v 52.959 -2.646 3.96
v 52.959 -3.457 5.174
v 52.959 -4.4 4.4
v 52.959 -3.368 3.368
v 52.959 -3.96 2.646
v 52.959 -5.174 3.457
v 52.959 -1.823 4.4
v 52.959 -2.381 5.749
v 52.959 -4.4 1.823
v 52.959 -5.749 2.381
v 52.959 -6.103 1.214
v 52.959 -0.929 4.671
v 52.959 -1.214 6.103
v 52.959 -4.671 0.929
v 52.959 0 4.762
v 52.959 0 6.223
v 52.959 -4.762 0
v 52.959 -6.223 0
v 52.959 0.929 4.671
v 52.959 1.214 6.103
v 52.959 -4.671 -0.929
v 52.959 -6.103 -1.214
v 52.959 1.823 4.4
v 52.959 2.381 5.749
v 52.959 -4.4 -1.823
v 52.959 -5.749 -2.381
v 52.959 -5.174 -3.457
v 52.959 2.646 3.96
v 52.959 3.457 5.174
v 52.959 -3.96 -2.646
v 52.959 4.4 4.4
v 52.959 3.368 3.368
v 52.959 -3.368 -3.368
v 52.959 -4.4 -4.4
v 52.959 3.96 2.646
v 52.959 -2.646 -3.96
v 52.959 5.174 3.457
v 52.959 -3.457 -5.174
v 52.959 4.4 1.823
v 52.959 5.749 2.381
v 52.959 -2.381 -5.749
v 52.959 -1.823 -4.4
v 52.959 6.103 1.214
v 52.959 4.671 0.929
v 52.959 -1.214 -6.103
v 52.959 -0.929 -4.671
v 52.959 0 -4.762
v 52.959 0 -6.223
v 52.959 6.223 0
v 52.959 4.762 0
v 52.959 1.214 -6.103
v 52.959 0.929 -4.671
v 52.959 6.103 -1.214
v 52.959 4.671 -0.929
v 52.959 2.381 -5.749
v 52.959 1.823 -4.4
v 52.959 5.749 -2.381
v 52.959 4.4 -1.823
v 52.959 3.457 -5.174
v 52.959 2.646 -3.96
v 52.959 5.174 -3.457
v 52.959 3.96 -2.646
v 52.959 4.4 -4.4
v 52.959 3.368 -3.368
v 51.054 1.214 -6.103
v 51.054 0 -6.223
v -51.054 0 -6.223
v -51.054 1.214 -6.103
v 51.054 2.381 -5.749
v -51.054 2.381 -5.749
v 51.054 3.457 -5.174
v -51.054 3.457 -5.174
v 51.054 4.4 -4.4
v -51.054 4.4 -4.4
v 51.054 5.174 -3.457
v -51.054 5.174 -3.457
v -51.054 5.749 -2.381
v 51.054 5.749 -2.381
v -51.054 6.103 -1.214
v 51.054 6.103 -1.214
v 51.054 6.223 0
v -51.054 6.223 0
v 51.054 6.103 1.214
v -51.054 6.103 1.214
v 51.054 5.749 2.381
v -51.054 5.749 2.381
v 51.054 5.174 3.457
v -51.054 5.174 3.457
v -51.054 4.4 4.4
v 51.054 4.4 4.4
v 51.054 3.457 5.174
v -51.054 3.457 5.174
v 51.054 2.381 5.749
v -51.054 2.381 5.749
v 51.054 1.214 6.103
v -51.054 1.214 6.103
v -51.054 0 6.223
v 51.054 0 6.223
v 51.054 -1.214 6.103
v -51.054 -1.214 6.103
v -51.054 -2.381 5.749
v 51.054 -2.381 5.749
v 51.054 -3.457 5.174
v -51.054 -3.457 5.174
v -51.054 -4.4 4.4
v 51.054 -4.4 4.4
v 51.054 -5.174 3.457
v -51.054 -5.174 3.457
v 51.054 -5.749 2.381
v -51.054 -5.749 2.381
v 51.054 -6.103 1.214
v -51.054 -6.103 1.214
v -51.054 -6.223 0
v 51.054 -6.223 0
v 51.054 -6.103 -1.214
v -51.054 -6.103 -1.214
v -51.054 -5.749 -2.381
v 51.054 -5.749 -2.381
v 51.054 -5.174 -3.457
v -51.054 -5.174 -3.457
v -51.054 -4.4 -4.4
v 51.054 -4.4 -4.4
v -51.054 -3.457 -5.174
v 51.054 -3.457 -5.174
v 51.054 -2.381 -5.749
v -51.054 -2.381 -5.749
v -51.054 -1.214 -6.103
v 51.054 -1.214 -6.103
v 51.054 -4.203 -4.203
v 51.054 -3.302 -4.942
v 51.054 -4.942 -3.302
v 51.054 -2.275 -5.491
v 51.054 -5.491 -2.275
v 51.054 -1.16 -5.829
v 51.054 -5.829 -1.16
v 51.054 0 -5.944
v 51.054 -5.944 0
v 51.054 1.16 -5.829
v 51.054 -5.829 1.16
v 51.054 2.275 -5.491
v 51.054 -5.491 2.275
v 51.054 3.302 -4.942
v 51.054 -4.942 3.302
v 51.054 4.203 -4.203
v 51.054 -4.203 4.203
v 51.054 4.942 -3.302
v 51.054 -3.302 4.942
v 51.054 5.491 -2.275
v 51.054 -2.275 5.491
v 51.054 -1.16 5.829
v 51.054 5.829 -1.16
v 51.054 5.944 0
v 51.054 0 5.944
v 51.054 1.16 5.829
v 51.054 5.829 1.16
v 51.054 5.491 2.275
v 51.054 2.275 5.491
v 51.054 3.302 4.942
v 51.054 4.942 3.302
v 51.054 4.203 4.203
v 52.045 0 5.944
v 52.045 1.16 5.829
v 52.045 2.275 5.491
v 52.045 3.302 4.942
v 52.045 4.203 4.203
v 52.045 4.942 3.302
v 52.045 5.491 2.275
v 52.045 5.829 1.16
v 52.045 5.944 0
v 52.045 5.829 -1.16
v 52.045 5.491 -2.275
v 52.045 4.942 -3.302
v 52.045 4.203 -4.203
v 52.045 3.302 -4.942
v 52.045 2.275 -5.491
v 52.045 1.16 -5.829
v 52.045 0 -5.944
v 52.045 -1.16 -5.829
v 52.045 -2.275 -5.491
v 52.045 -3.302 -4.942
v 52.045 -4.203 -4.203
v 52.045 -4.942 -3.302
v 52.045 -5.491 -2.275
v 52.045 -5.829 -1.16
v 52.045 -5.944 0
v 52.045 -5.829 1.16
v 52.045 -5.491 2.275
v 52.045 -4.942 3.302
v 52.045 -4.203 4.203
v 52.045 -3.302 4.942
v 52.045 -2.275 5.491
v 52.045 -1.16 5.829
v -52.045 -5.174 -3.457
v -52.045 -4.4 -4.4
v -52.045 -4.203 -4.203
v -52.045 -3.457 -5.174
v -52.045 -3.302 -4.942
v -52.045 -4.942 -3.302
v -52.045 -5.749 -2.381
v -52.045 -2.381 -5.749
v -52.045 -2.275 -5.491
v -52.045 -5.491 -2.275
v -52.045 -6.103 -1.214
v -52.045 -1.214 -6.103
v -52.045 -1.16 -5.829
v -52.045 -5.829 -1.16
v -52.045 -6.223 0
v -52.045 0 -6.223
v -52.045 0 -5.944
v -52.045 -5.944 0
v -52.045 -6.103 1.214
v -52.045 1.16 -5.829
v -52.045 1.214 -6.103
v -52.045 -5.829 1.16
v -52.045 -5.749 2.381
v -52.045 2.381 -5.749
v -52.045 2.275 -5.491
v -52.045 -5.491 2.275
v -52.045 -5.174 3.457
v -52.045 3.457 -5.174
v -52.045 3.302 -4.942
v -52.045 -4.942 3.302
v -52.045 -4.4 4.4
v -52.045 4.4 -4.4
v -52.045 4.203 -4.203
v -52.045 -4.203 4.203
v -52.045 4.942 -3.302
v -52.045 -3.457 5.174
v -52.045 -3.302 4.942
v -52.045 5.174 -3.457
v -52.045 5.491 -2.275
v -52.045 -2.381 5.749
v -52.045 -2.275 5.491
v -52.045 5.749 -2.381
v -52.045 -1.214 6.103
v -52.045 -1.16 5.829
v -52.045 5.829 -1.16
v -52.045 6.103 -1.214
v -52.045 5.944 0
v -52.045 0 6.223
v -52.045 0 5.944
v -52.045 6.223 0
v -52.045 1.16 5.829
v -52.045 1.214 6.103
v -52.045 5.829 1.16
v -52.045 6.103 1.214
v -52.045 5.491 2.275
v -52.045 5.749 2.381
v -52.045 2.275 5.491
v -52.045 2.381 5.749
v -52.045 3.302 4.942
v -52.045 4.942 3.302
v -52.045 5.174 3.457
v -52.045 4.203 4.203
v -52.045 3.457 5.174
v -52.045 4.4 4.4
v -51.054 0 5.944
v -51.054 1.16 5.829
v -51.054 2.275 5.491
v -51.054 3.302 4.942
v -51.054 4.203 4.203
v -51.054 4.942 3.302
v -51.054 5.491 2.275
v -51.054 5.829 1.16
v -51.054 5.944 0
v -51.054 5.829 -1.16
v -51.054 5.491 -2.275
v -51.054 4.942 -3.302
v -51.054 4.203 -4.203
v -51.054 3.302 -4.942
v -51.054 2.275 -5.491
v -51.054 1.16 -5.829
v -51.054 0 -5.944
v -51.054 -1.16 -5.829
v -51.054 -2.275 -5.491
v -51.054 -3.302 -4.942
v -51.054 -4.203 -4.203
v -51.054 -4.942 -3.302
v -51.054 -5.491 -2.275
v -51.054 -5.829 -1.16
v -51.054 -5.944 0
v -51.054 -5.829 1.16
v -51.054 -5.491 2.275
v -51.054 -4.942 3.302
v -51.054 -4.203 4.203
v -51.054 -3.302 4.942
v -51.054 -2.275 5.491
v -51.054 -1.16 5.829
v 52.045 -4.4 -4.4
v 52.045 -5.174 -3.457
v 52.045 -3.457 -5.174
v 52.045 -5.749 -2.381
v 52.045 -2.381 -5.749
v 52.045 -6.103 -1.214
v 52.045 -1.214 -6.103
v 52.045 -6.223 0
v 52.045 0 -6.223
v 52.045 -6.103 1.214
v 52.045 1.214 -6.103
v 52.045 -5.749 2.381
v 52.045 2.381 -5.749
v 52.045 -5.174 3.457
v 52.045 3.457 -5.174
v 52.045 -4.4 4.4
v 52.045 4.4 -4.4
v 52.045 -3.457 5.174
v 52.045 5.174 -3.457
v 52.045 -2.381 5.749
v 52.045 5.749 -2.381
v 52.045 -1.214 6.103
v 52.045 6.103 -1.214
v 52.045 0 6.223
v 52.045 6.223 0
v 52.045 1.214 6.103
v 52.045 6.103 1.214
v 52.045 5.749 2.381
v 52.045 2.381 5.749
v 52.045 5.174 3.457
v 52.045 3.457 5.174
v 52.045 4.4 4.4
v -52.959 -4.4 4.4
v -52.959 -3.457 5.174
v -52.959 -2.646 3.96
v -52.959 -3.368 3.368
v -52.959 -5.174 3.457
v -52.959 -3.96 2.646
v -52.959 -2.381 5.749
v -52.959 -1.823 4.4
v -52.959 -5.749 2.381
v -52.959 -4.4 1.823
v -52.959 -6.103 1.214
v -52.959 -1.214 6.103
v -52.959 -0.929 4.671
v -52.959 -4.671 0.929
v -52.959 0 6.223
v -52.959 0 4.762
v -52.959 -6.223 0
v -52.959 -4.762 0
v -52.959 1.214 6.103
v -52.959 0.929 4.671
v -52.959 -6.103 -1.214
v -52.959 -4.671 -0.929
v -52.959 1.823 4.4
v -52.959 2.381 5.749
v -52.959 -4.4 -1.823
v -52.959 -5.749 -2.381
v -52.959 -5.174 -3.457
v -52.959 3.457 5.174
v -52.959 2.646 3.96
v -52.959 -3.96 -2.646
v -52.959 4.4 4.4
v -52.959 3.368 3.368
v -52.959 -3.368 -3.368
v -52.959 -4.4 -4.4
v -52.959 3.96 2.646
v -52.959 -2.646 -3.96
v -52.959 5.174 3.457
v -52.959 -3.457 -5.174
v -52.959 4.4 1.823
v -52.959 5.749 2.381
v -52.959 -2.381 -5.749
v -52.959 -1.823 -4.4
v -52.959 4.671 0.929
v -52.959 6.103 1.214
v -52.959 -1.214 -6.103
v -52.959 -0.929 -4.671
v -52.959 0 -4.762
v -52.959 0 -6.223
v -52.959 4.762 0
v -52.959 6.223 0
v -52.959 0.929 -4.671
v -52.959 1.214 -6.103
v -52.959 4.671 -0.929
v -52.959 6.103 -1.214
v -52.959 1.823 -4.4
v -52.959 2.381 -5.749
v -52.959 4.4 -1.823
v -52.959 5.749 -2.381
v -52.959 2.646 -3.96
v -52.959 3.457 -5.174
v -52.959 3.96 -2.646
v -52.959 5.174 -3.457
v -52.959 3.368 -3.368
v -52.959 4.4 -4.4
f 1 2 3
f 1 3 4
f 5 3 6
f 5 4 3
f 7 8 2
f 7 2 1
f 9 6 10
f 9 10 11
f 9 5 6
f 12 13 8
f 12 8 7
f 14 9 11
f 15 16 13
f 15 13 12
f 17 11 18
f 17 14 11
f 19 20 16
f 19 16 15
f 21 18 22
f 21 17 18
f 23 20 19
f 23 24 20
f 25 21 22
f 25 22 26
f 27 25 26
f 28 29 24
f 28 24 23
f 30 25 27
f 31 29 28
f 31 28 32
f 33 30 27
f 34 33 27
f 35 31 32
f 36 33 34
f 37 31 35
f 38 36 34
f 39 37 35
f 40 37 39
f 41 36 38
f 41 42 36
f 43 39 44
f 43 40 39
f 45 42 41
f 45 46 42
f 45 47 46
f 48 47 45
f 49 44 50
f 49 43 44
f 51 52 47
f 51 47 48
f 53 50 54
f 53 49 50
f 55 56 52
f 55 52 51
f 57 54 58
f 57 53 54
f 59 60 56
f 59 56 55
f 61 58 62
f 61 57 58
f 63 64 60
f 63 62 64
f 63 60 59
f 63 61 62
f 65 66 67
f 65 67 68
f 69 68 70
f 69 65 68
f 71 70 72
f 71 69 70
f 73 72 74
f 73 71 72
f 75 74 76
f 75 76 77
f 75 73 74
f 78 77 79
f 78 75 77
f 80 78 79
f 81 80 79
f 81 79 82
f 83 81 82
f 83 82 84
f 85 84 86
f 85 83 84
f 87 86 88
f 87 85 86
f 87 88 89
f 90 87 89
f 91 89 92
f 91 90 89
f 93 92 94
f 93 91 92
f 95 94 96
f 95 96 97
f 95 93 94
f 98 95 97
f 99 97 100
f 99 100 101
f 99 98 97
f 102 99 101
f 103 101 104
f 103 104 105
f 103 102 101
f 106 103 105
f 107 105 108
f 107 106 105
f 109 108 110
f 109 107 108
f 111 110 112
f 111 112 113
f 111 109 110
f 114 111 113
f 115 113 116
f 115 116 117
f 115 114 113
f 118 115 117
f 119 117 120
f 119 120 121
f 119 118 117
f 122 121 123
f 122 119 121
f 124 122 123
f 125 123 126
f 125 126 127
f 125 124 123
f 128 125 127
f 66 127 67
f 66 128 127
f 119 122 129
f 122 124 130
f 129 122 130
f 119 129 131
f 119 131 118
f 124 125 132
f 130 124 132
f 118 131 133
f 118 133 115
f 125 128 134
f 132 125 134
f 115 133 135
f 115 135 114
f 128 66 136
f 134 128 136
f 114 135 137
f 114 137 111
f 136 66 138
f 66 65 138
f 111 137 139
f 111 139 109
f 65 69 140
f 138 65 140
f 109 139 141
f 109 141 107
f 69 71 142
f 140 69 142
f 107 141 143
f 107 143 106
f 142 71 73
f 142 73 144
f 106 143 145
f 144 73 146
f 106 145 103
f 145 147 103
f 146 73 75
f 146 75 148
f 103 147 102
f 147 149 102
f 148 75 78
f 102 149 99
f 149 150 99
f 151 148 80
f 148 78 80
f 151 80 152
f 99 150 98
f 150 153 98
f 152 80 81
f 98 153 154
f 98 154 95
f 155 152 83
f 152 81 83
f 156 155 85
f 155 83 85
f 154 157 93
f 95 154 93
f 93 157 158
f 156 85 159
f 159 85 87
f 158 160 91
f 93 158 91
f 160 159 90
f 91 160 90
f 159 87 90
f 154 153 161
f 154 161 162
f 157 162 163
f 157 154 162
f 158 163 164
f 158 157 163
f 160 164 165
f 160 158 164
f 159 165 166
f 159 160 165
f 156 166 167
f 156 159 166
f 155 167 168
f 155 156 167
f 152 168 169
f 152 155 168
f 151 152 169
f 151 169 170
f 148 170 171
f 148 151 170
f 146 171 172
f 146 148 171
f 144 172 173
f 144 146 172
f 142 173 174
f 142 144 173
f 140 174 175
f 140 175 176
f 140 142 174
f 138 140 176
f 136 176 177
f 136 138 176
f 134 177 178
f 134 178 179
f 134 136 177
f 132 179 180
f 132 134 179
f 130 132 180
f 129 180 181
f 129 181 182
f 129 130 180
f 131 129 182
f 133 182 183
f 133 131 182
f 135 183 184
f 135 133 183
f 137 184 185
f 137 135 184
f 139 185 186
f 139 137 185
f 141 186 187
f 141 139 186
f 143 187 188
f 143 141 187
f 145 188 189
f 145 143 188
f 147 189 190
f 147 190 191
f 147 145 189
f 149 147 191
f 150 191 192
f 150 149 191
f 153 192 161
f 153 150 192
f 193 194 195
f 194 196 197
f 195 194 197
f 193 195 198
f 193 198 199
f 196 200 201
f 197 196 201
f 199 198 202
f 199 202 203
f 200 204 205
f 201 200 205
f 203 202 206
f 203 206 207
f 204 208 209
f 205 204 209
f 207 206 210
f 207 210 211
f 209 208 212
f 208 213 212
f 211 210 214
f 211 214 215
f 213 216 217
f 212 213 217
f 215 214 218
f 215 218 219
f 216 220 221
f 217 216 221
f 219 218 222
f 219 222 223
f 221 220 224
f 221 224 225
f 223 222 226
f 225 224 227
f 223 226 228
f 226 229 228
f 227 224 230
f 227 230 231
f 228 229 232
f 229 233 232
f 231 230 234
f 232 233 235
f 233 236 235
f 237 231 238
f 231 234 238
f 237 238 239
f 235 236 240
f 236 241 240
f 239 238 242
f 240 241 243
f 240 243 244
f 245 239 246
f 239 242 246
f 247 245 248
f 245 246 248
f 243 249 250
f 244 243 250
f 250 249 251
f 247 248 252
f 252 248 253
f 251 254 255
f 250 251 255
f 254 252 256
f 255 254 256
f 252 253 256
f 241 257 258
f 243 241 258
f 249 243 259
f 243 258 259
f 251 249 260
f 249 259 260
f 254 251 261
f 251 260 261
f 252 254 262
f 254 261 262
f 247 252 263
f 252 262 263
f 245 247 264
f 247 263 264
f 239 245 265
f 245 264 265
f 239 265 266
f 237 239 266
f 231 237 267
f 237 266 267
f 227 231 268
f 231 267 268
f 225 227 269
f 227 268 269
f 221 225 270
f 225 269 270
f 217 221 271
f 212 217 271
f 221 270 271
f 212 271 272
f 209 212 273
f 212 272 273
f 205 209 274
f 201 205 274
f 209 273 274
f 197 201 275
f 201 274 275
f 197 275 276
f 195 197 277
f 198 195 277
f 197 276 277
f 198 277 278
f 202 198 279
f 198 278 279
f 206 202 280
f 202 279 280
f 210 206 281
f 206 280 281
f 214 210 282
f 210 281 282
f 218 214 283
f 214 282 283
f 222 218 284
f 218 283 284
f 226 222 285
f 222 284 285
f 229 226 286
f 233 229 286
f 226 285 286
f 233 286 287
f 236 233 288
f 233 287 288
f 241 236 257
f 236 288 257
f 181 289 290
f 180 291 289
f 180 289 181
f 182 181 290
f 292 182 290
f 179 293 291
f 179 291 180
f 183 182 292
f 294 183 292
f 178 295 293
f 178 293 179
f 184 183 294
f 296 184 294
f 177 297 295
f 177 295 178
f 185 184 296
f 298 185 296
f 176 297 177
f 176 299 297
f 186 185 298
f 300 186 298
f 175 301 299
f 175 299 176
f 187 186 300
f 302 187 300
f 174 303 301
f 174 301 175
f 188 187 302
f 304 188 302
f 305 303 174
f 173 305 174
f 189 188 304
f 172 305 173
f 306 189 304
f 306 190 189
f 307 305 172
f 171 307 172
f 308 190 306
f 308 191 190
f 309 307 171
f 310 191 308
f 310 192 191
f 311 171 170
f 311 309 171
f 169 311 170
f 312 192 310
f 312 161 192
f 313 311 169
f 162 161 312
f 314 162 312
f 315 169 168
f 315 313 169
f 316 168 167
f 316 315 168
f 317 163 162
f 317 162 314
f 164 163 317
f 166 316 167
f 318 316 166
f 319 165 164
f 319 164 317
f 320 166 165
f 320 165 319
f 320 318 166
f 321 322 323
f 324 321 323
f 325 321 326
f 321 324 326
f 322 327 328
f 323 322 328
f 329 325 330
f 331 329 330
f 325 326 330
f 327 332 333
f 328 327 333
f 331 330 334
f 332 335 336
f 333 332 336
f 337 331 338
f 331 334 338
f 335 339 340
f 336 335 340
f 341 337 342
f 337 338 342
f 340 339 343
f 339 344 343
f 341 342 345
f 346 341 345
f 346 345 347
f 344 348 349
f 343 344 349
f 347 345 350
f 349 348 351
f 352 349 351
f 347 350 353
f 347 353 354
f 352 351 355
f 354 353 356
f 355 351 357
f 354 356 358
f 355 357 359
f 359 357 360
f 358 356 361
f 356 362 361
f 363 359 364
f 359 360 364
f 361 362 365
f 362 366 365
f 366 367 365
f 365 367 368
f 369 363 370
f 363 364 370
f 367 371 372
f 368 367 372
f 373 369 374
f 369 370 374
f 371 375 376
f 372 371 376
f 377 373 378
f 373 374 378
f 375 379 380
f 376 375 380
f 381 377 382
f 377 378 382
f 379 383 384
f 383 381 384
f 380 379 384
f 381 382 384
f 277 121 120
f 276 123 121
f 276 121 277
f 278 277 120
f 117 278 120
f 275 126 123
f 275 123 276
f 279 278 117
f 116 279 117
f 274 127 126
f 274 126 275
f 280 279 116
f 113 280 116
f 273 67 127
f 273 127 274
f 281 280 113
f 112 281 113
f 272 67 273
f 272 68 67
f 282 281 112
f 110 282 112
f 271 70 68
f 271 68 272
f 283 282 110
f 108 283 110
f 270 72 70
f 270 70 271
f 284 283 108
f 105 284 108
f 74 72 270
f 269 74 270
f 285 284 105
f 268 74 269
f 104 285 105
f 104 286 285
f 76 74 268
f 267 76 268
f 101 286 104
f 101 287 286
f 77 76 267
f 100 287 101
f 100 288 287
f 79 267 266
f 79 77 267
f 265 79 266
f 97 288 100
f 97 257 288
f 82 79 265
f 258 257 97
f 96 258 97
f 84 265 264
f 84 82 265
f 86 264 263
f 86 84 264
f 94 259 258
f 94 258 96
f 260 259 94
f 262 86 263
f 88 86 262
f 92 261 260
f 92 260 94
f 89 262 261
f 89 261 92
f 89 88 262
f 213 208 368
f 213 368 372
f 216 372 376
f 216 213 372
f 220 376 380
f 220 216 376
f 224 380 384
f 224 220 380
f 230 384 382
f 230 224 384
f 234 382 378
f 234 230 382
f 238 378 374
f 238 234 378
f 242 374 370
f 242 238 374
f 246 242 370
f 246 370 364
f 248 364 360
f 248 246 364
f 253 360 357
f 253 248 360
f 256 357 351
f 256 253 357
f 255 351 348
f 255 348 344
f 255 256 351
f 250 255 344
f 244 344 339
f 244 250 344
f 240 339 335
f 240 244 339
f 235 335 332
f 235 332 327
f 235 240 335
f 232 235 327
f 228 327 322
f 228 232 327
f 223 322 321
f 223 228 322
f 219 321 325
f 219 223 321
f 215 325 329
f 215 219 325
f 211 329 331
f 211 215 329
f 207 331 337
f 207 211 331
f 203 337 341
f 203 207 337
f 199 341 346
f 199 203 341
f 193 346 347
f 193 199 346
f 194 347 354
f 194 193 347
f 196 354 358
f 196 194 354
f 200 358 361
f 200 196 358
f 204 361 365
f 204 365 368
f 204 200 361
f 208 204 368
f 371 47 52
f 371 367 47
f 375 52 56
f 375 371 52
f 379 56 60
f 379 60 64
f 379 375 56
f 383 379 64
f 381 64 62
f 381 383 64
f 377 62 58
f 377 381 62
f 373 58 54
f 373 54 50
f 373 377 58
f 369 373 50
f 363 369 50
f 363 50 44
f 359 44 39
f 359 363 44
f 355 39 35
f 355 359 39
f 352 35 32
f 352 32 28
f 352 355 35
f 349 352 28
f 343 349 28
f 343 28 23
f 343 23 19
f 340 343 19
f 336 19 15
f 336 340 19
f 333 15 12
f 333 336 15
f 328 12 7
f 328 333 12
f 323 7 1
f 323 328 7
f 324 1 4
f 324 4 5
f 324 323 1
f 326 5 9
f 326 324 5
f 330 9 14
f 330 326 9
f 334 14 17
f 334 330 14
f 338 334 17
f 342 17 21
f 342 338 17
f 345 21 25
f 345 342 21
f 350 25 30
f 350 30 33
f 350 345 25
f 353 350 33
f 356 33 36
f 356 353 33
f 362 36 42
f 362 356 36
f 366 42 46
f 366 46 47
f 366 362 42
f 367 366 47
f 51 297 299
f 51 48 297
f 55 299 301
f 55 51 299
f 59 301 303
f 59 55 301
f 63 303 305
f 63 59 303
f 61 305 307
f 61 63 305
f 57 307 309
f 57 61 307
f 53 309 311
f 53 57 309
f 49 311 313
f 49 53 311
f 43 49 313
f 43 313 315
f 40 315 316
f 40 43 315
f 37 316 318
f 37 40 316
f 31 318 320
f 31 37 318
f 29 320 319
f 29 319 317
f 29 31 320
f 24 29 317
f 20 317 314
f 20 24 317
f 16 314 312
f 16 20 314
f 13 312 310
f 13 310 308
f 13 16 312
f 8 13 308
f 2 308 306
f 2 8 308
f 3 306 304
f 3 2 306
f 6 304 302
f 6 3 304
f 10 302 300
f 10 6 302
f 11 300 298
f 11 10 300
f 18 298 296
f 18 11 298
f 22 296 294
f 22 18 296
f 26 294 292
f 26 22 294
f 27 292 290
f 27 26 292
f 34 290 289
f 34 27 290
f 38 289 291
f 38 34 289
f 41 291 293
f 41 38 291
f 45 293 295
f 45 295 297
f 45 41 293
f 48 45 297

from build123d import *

# Parameters (mm, degrees)
SKETCH1_R           = 6.223
SKETCH1_R_2         = 4.7625
BOSS_EXTRUDE1_DEPTH = 52.959
SKETCH2_R           = 6.35
SKETCH2_R_2         = 5.9436
CUT_EXTRUDE1_DEPTH  = 0.9906


with BuildPart() as part:
    # Sketch1 → Boss-Extrude1 (new body, symmetric)
    with BuildSketch(Plane(origin=(0, 0, 0), x_dir=(0, 0, -1), z_dir=(1, 0, 0))):
        Circle(SKETCH1_R)
        Circle(SKETCH1_R_2, mode=Mode.SUBTRACT)
    extrude(amount=BOSS_EXTRUDE1_DEPTH, both=True)

    # Sketch2 → Cut-Extrude1 (cut)
    with BuildSketch(Plane.ZY.offset(51.054)):
        Circle(SKETCH2_R)
        Circle(SKETCH2_R_2, mode=Mode.SUBTRACT)
    cut_extrude1 = extrude(amount=CUT_EXTRUDE1_DEPTH, mode=Mode.SUBTRACT)

    # Mirror1: Cut-Extrude1 across plane
    add(cut_extrude1.mirror(Plane(origin=(0, 0, 0), x_dir=(0, 0, 1), z_dir=(1, 0, 0))), mode=Mode.SUBTRACT)


solid = part.part
